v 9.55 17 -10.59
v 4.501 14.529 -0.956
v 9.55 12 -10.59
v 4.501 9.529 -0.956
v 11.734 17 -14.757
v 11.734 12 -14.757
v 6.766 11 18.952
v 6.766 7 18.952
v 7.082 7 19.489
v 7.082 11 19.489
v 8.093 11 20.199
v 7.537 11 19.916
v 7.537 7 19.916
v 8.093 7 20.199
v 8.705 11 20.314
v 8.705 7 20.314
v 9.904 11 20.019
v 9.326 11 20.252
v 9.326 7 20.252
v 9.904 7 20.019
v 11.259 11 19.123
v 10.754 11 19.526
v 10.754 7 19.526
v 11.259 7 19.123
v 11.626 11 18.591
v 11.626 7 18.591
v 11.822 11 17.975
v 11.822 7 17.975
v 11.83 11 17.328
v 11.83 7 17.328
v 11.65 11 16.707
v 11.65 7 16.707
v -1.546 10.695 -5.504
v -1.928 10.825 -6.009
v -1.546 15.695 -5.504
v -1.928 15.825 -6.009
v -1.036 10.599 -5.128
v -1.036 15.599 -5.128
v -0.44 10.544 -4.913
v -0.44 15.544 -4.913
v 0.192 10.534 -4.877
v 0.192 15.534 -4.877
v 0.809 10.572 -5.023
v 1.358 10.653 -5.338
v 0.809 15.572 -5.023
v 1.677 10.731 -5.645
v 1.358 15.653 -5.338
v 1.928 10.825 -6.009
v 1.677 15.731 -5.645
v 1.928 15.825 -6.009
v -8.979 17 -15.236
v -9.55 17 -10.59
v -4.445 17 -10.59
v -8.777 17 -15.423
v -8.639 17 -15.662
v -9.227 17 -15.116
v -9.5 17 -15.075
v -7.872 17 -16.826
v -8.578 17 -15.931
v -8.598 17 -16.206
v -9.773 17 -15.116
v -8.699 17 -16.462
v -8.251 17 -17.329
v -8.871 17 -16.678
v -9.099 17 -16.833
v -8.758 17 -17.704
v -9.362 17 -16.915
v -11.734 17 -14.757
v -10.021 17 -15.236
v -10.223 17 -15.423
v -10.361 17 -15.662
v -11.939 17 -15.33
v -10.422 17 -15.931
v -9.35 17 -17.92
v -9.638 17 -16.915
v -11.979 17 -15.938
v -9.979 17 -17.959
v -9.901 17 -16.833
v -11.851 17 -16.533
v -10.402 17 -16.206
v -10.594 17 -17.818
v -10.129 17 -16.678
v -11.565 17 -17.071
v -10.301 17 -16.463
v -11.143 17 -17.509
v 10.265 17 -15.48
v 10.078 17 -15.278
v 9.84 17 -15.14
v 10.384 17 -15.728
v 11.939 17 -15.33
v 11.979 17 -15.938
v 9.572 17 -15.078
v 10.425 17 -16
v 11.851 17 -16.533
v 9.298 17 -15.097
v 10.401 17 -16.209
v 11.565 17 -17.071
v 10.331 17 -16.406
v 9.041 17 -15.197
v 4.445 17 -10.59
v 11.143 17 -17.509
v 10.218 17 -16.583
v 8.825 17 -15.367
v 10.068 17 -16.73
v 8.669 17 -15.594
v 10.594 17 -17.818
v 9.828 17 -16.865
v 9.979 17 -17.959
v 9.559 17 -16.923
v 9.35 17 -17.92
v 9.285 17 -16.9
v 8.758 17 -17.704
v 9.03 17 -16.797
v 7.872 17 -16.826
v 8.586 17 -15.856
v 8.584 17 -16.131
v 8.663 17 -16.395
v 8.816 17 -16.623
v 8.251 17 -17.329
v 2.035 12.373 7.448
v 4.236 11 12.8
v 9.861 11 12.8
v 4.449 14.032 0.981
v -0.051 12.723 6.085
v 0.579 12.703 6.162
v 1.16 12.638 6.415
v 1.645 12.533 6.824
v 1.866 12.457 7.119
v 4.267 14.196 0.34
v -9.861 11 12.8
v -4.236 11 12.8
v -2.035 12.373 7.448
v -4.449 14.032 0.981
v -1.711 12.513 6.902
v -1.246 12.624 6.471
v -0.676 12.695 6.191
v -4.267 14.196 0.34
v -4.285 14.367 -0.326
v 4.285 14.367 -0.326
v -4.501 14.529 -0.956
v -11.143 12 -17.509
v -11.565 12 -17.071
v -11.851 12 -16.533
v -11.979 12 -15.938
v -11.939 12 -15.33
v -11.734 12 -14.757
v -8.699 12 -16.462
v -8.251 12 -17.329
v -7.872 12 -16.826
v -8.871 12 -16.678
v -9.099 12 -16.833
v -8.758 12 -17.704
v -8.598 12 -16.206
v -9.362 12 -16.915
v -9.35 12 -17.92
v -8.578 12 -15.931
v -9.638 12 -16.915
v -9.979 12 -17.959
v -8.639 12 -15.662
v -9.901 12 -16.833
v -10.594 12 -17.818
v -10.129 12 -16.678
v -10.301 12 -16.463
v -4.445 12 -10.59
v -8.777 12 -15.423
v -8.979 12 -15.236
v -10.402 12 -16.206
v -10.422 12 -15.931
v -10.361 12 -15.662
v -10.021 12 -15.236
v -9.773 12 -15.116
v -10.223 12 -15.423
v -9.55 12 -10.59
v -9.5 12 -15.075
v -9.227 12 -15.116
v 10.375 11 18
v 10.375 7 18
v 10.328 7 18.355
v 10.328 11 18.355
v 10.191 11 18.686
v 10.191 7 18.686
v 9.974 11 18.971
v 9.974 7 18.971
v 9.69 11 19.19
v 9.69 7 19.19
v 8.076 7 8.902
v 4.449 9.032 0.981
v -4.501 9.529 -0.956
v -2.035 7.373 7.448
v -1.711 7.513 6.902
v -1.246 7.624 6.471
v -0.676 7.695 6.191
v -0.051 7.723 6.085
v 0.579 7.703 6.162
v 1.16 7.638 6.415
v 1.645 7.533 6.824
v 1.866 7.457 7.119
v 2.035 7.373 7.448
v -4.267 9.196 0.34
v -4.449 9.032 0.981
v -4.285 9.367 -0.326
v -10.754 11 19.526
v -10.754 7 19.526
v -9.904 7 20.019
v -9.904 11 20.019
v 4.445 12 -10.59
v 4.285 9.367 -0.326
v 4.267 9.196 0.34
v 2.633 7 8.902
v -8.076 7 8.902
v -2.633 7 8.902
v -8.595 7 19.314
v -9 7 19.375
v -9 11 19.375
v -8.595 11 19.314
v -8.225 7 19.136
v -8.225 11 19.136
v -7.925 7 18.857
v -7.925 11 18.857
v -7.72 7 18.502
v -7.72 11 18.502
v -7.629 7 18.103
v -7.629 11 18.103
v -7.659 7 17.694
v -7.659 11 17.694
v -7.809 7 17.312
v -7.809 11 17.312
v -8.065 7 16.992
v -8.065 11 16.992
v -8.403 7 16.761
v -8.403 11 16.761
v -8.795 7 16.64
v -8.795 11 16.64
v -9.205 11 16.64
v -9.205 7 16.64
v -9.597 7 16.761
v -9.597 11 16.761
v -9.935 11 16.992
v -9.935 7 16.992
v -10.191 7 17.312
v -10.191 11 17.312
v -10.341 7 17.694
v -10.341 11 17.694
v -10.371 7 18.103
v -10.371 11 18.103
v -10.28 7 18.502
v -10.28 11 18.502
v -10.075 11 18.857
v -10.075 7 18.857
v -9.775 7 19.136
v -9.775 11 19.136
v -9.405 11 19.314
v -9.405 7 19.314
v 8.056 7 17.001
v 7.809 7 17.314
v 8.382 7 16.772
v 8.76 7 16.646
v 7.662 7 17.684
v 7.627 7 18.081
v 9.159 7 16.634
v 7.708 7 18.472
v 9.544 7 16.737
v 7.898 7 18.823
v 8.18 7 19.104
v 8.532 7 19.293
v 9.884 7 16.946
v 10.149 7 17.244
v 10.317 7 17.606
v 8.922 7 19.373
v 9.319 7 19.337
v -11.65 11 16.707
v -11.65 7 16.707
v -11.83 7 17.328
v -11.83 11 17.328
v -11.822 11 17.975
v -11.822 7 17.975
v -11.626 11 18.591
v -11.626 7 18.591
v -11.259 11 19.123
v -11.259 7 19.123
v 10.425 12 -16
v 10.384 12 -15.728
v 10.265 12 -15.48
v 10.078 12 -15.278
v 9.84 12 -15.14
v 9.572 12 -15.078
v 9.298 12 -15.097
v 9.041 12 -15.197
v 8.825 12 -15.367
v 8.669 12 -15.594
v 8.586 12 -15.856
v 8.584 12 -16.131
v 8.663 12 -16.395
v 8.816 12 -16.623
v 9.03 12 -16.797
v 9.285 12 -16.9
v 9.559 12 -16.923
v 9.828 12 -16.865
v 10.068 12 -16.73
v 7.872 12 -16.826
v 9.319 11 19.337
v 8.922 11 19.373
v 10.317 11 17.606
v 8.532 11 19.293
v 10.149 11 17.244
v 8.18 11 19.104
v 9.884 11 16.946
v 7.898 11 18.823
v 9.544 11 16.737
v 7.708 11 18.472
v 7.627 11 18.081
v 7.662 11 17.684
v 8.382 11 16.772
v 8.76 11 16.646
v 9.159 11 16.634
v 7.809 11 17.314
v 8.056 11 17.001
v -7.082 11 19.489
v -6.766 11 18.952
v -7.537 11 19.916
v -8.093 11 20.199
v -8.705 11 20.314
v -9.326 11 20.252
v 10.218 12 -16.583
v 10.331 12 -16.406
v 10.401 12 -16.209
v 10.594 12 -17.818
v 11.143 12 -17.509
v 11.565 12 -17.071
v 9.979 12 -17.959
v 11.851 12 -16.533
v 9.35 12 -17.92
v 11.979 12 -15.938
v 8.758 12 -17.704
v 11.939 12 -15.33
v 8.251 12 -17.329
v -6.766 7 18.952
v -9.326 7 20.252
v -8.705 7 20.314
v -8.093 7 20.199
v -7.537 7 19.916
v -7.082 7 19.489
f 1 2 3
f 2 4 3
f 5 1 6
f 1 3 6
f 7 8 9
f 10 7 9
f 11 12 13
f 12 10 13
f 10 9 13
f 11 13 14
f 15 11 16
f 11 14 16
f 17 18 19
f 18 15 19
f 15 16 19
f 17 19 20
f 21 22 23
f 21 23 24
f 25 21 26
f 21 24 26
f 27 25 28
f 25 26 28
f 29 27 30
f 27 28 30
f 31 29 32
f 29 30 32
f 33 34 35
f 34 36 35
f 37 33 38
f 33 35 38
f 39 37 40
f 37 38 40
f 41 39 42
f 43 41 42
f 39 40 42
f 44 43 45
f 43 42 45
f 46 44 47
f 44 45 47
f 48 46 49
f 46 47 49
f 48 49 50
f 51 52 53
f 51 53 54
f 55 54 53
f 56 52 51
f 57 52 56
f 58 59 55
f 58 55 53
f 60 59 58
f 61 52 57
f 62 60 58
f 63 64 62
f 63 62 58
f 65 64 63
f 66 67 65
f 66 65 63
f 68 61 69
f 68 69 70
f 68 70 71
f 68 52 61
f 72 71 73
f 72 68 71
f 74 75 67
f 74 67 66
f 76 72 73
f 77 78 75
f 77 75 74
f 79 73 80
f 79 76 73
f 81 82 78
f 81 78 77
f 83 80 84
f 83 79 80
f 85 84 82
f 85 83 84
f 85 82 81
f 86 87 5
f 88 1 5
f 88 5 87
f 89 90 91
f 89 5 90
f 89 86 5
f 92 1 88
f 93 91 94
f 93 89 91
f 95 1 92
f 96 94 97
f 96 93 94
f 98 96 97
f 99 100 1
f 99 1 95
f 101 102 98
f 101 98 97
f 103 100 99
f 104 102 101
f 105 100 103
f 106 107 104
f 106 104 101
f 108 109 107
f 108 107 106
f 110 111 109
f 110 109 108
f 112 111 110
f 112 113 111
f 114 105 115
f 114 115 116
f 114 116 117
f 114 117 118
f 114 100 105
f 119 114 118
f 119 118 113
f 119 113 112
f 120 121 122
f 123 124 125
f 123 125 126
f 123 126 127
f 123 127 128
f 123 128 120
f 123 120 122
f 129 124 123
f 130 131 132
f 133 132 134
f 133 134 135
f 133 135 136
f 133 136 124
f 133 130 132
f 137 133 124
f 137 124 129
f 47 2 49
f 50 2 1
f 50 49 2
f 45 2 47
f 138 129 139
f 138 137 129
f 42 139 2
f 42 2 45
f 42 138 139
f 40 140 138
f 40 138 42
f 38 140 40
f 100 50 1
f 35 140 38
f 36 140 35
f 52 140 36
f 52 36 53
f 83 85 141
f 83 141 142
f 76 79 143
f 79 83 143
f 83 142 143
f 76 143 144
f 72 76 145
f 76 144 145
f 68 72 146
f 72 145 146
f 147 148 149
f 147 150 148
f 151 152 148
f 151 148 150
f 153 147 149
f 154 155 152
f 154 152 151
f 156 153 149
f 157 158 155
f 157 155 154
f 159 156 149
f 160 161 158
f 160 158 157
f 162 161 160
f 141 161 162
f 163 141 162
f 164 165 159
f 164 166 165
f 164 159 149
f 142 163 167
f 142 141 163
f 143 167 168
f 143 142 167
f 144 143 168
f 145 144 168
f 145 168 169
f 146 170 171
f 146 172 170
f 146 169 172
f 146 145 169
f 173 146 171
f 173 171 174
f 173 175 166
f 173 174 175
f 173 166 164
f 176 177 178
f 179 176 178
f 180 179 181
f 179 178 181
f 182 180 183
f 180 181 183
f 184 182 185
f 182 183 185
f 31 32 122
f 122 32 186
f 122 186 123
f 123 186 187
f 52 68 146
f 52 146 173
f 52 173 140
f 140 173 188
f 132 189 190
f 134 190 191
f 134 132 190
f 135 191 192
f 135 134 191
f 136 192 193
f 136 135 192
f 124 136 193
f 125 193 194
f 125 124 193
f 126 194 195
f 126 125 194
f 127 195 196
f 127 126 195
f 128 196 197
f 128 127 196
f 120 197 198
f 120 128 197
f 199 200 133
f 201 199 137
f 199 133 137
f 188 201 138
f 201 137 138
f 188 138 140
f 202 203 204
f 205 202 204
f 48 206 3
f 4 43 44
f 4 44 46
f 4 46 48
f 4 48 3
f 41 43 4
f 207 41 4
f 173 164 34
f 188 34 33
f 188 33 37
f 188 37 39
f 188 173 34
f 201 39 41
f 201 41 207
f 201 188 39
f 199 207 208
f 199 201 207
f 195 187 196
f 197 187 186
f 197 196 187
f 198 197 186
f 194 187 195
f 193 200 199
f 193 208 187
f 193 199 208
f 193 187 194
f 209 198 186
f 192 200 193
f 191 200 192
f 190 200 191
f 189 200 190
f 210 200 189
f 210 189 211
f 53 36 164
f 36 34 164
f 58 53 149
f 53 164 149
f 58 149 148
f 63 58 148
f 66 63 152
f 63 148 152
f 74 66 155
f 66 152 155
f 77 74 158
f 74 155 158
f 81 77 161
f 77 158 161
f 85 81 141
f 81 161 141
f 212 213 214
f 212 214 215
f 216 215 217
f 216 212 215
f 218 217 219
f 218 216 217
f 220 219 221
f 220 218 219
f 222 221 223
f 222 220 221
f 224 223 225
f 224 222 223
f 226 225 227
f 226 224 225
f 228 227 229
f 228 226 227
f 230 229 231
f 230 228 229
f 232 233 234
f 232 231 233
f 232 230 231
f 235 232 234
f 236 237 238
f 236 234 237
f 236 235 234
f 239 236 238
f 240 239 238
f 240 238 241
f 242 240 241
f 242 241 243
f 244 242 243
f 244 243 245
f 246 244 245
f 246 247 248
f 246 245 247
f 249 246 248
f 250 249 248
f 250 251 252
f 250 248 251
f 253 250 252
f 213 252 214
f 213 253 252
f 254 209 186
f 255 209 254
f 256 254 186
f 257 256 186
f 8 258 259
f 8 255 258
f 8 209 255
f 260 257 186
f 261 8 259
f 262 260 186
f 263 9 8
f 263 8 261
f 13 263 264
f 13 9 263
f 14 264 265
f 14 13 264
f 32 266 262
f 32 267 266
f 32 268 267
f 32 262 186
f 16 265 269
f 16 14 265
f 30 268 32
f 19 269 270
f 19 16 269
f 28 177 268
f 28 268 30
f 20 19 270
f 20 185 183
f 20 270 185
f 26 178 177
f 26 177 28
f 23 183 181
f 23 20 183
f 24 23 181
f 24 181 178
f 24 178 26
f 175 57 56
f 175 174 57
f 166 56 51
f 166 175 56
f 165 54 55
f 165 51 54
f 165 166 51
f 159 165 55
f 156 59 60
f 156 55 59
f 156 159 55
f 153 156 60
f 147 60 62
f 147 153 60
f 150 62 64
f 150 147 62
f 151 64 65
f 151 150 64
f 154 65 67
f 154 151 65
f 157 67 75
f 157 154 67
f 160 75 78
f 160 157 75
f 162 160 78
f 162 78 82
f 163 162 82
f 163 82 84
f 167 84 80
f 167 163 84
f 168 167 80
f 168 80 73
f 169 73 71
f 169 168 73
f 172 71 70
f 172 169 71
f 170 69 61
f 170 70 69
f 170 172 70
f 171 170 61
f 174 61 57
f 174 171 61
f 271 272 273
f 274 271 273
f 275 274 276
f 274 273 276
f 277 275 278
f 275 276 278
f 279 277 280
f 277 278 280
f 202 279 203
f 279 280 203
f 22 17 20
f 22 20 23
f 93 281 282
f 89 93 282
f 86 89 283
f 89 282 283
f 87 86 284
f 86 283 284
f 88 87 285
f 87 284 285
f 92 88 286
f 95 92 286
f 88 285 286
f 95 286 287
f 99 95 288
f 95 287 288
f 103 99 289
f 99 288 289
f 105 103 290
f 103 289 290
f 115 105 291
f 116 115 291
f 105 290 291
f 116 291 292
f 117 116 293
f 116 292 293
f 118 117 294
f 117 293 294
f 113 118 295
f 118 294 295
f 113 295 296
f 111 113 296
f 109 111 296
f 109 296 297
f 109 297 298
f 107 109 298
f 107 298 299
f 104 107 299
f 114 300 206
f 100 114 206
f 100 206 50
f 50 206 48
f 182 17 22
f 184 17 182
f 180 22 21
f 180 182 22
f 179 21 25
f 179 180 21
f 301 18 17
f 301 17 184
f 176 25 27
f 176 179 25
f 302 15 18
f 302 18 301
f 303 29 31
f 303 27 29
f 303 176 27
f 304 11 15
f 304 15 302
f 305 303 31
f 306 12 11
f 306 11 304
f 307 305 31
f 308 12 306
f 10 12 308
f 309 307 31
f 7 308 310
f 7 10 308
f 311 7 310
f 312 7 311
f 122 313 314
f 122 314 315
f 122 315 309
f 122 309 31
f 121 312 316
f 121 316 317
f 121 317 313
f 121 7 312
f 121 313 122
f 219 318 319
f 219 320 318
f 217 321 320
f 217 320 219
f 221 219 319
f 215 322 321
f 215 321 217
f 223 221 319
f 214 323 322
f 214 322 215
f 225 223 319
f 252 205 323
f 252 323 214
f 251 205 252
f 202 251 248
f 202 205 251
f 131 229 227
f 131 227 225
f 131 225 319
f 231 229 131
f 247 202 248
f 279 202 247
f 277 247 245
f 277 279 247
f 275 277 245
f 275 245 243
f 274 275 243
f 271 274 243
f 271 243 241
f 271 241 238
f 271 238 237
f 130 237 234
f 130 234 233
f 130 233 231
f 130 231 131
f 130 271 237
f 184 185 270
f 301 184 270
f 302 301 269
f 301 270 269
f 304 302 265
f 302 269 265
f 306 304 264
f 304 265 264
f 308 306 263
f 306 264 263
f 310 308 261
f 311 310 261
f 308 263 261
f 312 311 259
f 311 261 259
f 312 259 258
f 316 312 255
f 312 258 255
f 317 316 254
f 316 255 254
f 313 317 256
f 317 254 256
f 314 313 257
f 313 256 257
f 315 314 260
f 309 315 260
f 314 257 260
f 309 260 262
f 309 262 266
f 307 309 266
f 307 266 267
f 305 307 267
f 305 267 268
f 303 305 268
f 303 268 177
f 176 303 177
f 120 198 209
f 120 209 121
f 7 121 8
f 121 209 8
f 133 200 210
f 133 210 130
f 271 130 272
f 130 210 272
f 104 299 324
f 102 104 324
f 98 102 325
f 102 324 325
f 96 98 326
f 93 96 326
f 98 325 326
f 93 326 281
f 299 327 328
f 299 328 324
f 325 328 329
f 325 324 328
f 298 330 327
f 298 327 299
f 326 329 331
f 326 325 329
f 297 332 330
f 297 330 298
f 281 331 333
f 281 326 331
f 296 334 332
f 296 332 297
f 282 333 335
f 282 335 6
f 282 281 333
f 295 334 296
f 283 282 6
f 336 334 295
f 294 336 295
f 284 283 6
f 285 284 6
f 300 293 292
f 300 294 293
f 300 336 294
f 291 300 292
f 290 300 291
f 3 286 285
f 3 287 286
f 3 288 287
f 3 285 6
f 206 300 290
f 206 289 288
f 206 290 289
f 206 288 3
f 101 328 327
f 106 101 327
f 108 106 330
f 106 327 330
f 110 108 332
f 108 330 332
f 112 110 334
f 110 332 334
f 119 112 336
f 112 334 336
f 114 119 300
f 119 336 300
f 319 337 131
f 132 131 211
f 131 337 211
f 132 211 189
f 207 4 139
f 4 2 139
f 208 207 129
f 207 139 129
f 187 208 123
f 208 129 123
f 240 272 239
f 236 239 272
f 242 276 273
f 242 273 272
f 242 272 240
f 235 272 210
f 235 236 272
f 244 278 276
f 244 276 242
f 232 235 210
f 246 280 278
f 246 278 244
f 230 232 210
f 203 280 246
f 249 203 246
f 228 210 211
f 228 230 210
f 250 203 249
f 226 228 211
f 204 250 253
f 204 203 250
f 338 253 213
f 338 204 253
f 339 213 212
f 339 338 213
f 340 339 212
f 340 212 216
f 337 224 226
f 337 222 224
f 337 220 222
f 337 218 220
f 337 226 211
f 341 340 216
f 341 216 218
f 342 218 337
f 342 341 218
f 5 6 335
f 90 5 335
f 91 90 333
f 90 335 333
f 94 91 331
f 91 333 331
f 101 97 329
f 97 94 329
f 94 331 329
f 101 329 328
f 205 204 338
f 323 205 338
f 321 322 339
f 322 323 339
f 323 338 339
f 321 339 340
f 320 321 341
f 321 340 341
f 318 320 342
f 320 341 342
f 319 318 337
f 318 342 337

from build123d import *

# Parameters (mm, degrees)
SKETCH1_W               = 26
SKETCH1_H               = 41
SKETCH1_R               = 1.375
SKETCH1_R_2             = 0.925
SKETCH1_H_2             = 4.4
BOSS_EXTRUDE1_DEPTH     = 6
SKETCH2_R               = 0.925
SKETCH2_R_2             = 1.375
BOSS_EXTRUDE2_DEPTH     = 15
CUT_EXTRUDE2_DEPTH      = 42.677451937
CUT_EXTRUDE2_DEPTH_BACK = 42.677451937
SKETCH4_W               = 26
SKETCH4_H               = 45.4
CUT_EXTRUDE1_DEPTH      = 7
FILLET1_R               = 2.2
FILLET2_R               = 2.2


with BuildPart() as part:
    # Sketch1 → Boss-Extrude1 (new body)
    # profile 1 of 2: a face of its own
    with BuildSketch(Plane(origin=(0, 0, 0), x_dir=(1, 0, 0), z_dir=(0, 1, 0))):
        Rectangle(SKETCH1_W, SKETCH1_H)
        with Locations(Location((-9, -18, 0), (0, 0, 270))):
            Circle(SKETCH1_R, mode=Mode.SUBTRACT)
        with BuildLine():
            ThreePointArc((10.375, -18), (9, -19.375), (7.625, -18))
            ThreePointArc((7.625, -18), (9, -16.625), (10.375, -18))
        make_face(mode=Mode.SUBTRACT)
        with Locations(Location((-9.5, 16, 0), (0, 0, 270))):
            Circle(SKETCH1_R_2, mode=Mode.SUBTRACT)
        with BuildLine():
            ThreePointArc((10.425, 16), (9.5, 15.075), (8.575, 16))
            ThreePointArc((8.575, 16), (9.5, 16.925), (10.425, 16))
        make_face(mode=Mode.SUBTRACT)
    # profile 2 of 2: a face of its own
    with BuildSketch(Plane(origin=(0, 0, 0), x_dir=(1, 0, 0), z_dir=(0, 1, 0))):
        with Locations((0, -22.7)):
            Rectangle(SKETCH1_W, SKETCH1_H_2)
    extrude(amount=BOSS_EXTRUDE1_DEPTH)

    # Sketch2 → Boss-Extrude2 (add)
    # profile 1 of 6: a face of its own
    with BuildSketch(Plane(origin=(0, 6, 0), x_dir=(1, 0, 0), z_dir=(0, 1, 0))):
        Polygon((12.587244228, 16.385905528), (10.85066935, 17.736574878), (9.114094472, 19.087244228), (0, 2.5), (4, 2.5), (4, 0), align=None)
        with BuildLine():
            ThreePointArc((10.425, 16), (8.669058384, 15.593599912), (10.067895068, 16.730150801))
            ThreePointArc((10.067895068, 16.730150801), (10.330941616, 16.406400088), (10.425, 16))
        make_face(mode=Mode.SUBTRACT)
    # profile 2 of 6: a face of its own
    with BuildSketch(Plane(origin=(0, 6, 0), x_dir=(1, 0, 0), z_dir=(0, 1, 0))):
        Polygon((-4, 0), (-4, 2.5), (0, 2.5), (-9.114094472, 19.087244228), (-12.587244228, 16.385905528), align=None)
        with Locations(Location((-9.5, 16, 0), (0, 0, 270))):
            Circle(SKETCH2_R, mode=Mode.SUBTRACT)
    # profile 3 of 6: a face of its own
    with BuildSketch(Plane(origin=(0, 6, 0), x_dir=(1, 0, 0), z_dir=(0, 1, 0))):
        Polygon((0, 2.5), (-4, 2.5), (-4, 0), (-4, -2.5), (0, -2.5), align=None)
    # profile 4 of 6: a face of its own
    with BuildSketch(Plane(origin=(0, 6, 0), x_dir=(1, 0, 0), z_dir=(0, 1, 0))):
        Polygon((4, 2.5), (0, 2.5), (0, -2.5), (4, -2.5), (4, 0), align=None)
    # profile 5 of 6: a face of its own
    with BuildSketch(Plane(origin=(0, 6, 0), x_dir=(1, 0, 0), z_dir=(0, 1, 0))):
        Polygon((12.482501962, -18.524099305), (4, 0), (4, -2.5), (0, -2.5), (7.724231954, -21.282516701), (10.103366958, -19.903308003), align=None)
        with BuildLine():
            ThreePointArc((10.375, -18), (10.191392249, -18.686447019), (9.689604349, -19.189567502))
            ThreePointArc((9.689604349, -19.189567502), (7.808607751, -17.313552981), (10.375, -18))
        make_face(mode=Mode.SUBTRACT)
    # profile 6 of 6: a face of its own
    with BuildSketch(Plane(origin=(0, 6, 0), x_dir=(1, 0, 0), z_dir=(0, 1, 0))):
        Polygon((-4, -2.5), (-4, 0), (-12.482501962, -18.524099305), (-7.724231954, -21.282516701), (0, -2.5), align=None)
        with Locations(Location((-9, -18, 0), (0, 0, 270))):
            Circle(SKETCH2_R_2, mode=Mode.SUBTRACT)
    extrude(amount=BOSS_EXTRUDE2_DEPTH)

    # Sketch6 → Cut-Extrude2 (cut, two sides: drawn at the far end of the back side and taken through both)
    with BuildSketch(Plane(origin=(13, 0, 0), x_dir=(0, 0, -1), z_dir=(1, 0, 0)).offset(-CUT_EXTRUDE2_DEPTH_BACK)):
        Polygon((-21.28, 17), (-21.28, 11), (-12.8, 11), (10.59, 17), align=None)
        Polygon((10.59, 12), (-12.8, 6), (19.09, 6), (19.09, 12), align=None)
        Polygon((-21.28, 21.511868699), (-21.28, 17), (10.59, 17), (19.087244228, 17), (19.087244228, 21.511868699), align=None)
    extrude(amount=CUT_EXTRUDE2_DEPTH + CUT_EXTRUDE2_DEPTH_BACK, mode=Mode.SUBTRACT)

    # Sketch4 → Cut-Extrude1 (cut)
    with BuildSketch(Plane.XZ):
        with Locations((0, 2.2)):
            Rectangle(SKETCH4_W, SKETCH4_H)
    extrude(amount=-CUT_EXTRUDE1_DEPTH, mode=Mode.SUBTRACT)

    # Fillet1
    # the kernel refuses this fillet: 2.2 mm, written as the material it takes off along each edge
    with BuildSketch(Plane(origin=(12.587244228, 7.402722975, -16.385905528), x_dir=(-0.46418305146339667, 0, 0.8857392927572592), z_dir=(0, 1, 0))) as fillet1_piece_1:
        with BuildLine():
            CenterArc((FILLET1_R * 0.83586855008, -FILLET1_R), FILLET1_R, 90, 79.782379698)
            Line((-FILLET1_R * 0.148272552074, -FILLET1_R * 0.822612596131), (0, 0))
            Line((0, 0), (FILLET1_R * 0.83586855008, 0))
        make_face()
    extrude(amount=14.194554051, mode=Mode.SUBTRACT)
    with BuildSketch(Plane(origin=(9.114094472, 5.550330565, -19.087244228), x_dir=(-0.48155808709989106, 0, 0.8764141764877459), z_dir=(0, 1, 0))) as fillet1_piece_2:
        with BuildLine():
            CenterArc((FILLET1_R * 1.17266716994, FILLET1_R), FILLET1_R, 170.912229019, 99.087770981)
            Line((FILLET1_R * 0.185219628956, FILLET1_R * 1.15794731336), (0, 0))
            Line((0, 0), (FILLET1_R * 1.17266716994, 0))
        make_face()
    extrude(amount=17.899338869, mode=Mode.SUBTRACT)
    with BuildSketch(Plane(origin=(-9.114094472, 5.550330565, -19.087244228), x_dir=(0.4815580870998917, 0, 0.8764141764877456), z_dir=(0, 1, 0))) as fillet1_piece_3:
        with BuildLine():
            CenterArc((FILLET1_R * 1.17266716994, -FILLET1_R), FILLET1_R, 90, 99.087770981)
            Line((FILLET1_R * 0.185219628956, -FILLET1_R * 1.15794731336), (0, 0))
            Line((0, 0), (FILLET1_R * 1.17266716994, 0))
        make_face()
    extrude(amount=17.899338869, mode=Mode.SUBTRACT)
    with BuildSketch(Plane(origin=(-12.587244228, 7.402722975, -16.385905528), x_dir=(0.46418305146339667, 0, 0.8857392927572592), z_dir=(0, 1, 0))) as fillet1_piece_4:
        with BuildLine():
            CenterArc((FILLET1_R * 0.83586855008, FILLET1_R), FILLET1_R, 190.217620302, 79.782379698)
            Line((-FILLET1_R * 0.148272552074, FILLET1_R * 0.822612596131), (0, 0))
            Line((0, 0), (FILLET1_R * 0.83586855008, 0))
        make_face()
    extrude(amount=14.194554051, mode=Mode.SUBTRACT)
    with BuildSketch(Plane(origin=(-12.482501962, 2.003928442, 18.524099305), x_dir=(0.4163419464168799, 0, -0.9092081080004752), z_dir=(0, 1, 0))) as fillet1_piece_5:
        with BuildLine():
            CenterArc((FILLET1_R * 0.908376646875, -FILLET1_R), FILLET1_R, 90, 84.502549141)
            Line((-FILLET1_R * 0.087023814771, -FILLET1_R * 0.904198533648), (0, 0))
            Line((0, 0), (FILLET1_R * 0.908376646875, 0))
        make_face()
    extrude(amount=13.992143116, mode=Mode.SUBTRACT)
    with BuildSketch(Plane(origin=(-7.724231954, 0.701160202, 21.282516701), x_dir=(0.3803394674675552, 0, -0.9248469546289788), z_dir=(0, 1, 0))) as fillet1_piece_6:
        with BuildLine():
            CenterArc((FILLET1_R * 1.14524359963, FILLET1_R), FILLET1_R, 172.25340707, 97.74659293)
            Line((FILLET1_R * 0.154369685137, FILLET1_R * 1.13479200861), (0, 0))
            Line((0, 0), (FILLET1_R * 1.14524359963, 0))
        make_face()
    extrude(amount=26.597679596, mode=Mode.SUBTRACT)
    with BuildSketch(Plane(origin=(12.482501962, 2.003928442, 18.524099305), x_dir=(-0.4163419464168806, 0, -0.9092081080004749), z_dir=(0, 1, 0))) as fillet1_piece_7:
        with BuildLine():
            CenterArc((FILLET1_R * 0.908376646875, FILLET1_R), FILLET1_R, 185.497450859, 84.502549141)
            Line((-FILLET1_R * 0.087023814771, FILLET1_R * 0.904198533648), (0, 0))
            Line((0, 0), (FILLET1_R * 0.908376646875, 0))
        make_face()
    extrude(amount=13.992143116, mode=Mode.SUBTRACT)
    with BuildSketch(Plane(origin=(7.724231954, 0.701160202, 21.282516701), x_dir=(-0.38033946746755576, 0, -0.9248469546289787), z_dir=(0, 1, 0))) as fillet1_piece_8:
        with BuildLine():
            CenterArc((FILLET1_R * 1.14524359963, -FILLET1_R), FILLET1_R, 90, 97.74659293)
            Line((FILLET1_R * 0.154369685137, -FILLET1_R * 1.13479200861), (0, 0))
            Line((0, 0), (FILLET1_R * 1.14524359963, 0))
        make_face()
    extrude(amount=26.597679596, mode=Mode.SUBTRACT)

    # Fillet2
    fillet2_edges = [part.edges().sort_by_distance(p)[0] for p in [
        (-4, 11.783454468, 0),
        (0, 12.424754168, -2.5),
        (4, 11.783454468, 0),
        (0, 11.142154767, 2.5),
    ]]
    fillet(fillet2_edges, radius=FILLET2_R)


solid = part.part
